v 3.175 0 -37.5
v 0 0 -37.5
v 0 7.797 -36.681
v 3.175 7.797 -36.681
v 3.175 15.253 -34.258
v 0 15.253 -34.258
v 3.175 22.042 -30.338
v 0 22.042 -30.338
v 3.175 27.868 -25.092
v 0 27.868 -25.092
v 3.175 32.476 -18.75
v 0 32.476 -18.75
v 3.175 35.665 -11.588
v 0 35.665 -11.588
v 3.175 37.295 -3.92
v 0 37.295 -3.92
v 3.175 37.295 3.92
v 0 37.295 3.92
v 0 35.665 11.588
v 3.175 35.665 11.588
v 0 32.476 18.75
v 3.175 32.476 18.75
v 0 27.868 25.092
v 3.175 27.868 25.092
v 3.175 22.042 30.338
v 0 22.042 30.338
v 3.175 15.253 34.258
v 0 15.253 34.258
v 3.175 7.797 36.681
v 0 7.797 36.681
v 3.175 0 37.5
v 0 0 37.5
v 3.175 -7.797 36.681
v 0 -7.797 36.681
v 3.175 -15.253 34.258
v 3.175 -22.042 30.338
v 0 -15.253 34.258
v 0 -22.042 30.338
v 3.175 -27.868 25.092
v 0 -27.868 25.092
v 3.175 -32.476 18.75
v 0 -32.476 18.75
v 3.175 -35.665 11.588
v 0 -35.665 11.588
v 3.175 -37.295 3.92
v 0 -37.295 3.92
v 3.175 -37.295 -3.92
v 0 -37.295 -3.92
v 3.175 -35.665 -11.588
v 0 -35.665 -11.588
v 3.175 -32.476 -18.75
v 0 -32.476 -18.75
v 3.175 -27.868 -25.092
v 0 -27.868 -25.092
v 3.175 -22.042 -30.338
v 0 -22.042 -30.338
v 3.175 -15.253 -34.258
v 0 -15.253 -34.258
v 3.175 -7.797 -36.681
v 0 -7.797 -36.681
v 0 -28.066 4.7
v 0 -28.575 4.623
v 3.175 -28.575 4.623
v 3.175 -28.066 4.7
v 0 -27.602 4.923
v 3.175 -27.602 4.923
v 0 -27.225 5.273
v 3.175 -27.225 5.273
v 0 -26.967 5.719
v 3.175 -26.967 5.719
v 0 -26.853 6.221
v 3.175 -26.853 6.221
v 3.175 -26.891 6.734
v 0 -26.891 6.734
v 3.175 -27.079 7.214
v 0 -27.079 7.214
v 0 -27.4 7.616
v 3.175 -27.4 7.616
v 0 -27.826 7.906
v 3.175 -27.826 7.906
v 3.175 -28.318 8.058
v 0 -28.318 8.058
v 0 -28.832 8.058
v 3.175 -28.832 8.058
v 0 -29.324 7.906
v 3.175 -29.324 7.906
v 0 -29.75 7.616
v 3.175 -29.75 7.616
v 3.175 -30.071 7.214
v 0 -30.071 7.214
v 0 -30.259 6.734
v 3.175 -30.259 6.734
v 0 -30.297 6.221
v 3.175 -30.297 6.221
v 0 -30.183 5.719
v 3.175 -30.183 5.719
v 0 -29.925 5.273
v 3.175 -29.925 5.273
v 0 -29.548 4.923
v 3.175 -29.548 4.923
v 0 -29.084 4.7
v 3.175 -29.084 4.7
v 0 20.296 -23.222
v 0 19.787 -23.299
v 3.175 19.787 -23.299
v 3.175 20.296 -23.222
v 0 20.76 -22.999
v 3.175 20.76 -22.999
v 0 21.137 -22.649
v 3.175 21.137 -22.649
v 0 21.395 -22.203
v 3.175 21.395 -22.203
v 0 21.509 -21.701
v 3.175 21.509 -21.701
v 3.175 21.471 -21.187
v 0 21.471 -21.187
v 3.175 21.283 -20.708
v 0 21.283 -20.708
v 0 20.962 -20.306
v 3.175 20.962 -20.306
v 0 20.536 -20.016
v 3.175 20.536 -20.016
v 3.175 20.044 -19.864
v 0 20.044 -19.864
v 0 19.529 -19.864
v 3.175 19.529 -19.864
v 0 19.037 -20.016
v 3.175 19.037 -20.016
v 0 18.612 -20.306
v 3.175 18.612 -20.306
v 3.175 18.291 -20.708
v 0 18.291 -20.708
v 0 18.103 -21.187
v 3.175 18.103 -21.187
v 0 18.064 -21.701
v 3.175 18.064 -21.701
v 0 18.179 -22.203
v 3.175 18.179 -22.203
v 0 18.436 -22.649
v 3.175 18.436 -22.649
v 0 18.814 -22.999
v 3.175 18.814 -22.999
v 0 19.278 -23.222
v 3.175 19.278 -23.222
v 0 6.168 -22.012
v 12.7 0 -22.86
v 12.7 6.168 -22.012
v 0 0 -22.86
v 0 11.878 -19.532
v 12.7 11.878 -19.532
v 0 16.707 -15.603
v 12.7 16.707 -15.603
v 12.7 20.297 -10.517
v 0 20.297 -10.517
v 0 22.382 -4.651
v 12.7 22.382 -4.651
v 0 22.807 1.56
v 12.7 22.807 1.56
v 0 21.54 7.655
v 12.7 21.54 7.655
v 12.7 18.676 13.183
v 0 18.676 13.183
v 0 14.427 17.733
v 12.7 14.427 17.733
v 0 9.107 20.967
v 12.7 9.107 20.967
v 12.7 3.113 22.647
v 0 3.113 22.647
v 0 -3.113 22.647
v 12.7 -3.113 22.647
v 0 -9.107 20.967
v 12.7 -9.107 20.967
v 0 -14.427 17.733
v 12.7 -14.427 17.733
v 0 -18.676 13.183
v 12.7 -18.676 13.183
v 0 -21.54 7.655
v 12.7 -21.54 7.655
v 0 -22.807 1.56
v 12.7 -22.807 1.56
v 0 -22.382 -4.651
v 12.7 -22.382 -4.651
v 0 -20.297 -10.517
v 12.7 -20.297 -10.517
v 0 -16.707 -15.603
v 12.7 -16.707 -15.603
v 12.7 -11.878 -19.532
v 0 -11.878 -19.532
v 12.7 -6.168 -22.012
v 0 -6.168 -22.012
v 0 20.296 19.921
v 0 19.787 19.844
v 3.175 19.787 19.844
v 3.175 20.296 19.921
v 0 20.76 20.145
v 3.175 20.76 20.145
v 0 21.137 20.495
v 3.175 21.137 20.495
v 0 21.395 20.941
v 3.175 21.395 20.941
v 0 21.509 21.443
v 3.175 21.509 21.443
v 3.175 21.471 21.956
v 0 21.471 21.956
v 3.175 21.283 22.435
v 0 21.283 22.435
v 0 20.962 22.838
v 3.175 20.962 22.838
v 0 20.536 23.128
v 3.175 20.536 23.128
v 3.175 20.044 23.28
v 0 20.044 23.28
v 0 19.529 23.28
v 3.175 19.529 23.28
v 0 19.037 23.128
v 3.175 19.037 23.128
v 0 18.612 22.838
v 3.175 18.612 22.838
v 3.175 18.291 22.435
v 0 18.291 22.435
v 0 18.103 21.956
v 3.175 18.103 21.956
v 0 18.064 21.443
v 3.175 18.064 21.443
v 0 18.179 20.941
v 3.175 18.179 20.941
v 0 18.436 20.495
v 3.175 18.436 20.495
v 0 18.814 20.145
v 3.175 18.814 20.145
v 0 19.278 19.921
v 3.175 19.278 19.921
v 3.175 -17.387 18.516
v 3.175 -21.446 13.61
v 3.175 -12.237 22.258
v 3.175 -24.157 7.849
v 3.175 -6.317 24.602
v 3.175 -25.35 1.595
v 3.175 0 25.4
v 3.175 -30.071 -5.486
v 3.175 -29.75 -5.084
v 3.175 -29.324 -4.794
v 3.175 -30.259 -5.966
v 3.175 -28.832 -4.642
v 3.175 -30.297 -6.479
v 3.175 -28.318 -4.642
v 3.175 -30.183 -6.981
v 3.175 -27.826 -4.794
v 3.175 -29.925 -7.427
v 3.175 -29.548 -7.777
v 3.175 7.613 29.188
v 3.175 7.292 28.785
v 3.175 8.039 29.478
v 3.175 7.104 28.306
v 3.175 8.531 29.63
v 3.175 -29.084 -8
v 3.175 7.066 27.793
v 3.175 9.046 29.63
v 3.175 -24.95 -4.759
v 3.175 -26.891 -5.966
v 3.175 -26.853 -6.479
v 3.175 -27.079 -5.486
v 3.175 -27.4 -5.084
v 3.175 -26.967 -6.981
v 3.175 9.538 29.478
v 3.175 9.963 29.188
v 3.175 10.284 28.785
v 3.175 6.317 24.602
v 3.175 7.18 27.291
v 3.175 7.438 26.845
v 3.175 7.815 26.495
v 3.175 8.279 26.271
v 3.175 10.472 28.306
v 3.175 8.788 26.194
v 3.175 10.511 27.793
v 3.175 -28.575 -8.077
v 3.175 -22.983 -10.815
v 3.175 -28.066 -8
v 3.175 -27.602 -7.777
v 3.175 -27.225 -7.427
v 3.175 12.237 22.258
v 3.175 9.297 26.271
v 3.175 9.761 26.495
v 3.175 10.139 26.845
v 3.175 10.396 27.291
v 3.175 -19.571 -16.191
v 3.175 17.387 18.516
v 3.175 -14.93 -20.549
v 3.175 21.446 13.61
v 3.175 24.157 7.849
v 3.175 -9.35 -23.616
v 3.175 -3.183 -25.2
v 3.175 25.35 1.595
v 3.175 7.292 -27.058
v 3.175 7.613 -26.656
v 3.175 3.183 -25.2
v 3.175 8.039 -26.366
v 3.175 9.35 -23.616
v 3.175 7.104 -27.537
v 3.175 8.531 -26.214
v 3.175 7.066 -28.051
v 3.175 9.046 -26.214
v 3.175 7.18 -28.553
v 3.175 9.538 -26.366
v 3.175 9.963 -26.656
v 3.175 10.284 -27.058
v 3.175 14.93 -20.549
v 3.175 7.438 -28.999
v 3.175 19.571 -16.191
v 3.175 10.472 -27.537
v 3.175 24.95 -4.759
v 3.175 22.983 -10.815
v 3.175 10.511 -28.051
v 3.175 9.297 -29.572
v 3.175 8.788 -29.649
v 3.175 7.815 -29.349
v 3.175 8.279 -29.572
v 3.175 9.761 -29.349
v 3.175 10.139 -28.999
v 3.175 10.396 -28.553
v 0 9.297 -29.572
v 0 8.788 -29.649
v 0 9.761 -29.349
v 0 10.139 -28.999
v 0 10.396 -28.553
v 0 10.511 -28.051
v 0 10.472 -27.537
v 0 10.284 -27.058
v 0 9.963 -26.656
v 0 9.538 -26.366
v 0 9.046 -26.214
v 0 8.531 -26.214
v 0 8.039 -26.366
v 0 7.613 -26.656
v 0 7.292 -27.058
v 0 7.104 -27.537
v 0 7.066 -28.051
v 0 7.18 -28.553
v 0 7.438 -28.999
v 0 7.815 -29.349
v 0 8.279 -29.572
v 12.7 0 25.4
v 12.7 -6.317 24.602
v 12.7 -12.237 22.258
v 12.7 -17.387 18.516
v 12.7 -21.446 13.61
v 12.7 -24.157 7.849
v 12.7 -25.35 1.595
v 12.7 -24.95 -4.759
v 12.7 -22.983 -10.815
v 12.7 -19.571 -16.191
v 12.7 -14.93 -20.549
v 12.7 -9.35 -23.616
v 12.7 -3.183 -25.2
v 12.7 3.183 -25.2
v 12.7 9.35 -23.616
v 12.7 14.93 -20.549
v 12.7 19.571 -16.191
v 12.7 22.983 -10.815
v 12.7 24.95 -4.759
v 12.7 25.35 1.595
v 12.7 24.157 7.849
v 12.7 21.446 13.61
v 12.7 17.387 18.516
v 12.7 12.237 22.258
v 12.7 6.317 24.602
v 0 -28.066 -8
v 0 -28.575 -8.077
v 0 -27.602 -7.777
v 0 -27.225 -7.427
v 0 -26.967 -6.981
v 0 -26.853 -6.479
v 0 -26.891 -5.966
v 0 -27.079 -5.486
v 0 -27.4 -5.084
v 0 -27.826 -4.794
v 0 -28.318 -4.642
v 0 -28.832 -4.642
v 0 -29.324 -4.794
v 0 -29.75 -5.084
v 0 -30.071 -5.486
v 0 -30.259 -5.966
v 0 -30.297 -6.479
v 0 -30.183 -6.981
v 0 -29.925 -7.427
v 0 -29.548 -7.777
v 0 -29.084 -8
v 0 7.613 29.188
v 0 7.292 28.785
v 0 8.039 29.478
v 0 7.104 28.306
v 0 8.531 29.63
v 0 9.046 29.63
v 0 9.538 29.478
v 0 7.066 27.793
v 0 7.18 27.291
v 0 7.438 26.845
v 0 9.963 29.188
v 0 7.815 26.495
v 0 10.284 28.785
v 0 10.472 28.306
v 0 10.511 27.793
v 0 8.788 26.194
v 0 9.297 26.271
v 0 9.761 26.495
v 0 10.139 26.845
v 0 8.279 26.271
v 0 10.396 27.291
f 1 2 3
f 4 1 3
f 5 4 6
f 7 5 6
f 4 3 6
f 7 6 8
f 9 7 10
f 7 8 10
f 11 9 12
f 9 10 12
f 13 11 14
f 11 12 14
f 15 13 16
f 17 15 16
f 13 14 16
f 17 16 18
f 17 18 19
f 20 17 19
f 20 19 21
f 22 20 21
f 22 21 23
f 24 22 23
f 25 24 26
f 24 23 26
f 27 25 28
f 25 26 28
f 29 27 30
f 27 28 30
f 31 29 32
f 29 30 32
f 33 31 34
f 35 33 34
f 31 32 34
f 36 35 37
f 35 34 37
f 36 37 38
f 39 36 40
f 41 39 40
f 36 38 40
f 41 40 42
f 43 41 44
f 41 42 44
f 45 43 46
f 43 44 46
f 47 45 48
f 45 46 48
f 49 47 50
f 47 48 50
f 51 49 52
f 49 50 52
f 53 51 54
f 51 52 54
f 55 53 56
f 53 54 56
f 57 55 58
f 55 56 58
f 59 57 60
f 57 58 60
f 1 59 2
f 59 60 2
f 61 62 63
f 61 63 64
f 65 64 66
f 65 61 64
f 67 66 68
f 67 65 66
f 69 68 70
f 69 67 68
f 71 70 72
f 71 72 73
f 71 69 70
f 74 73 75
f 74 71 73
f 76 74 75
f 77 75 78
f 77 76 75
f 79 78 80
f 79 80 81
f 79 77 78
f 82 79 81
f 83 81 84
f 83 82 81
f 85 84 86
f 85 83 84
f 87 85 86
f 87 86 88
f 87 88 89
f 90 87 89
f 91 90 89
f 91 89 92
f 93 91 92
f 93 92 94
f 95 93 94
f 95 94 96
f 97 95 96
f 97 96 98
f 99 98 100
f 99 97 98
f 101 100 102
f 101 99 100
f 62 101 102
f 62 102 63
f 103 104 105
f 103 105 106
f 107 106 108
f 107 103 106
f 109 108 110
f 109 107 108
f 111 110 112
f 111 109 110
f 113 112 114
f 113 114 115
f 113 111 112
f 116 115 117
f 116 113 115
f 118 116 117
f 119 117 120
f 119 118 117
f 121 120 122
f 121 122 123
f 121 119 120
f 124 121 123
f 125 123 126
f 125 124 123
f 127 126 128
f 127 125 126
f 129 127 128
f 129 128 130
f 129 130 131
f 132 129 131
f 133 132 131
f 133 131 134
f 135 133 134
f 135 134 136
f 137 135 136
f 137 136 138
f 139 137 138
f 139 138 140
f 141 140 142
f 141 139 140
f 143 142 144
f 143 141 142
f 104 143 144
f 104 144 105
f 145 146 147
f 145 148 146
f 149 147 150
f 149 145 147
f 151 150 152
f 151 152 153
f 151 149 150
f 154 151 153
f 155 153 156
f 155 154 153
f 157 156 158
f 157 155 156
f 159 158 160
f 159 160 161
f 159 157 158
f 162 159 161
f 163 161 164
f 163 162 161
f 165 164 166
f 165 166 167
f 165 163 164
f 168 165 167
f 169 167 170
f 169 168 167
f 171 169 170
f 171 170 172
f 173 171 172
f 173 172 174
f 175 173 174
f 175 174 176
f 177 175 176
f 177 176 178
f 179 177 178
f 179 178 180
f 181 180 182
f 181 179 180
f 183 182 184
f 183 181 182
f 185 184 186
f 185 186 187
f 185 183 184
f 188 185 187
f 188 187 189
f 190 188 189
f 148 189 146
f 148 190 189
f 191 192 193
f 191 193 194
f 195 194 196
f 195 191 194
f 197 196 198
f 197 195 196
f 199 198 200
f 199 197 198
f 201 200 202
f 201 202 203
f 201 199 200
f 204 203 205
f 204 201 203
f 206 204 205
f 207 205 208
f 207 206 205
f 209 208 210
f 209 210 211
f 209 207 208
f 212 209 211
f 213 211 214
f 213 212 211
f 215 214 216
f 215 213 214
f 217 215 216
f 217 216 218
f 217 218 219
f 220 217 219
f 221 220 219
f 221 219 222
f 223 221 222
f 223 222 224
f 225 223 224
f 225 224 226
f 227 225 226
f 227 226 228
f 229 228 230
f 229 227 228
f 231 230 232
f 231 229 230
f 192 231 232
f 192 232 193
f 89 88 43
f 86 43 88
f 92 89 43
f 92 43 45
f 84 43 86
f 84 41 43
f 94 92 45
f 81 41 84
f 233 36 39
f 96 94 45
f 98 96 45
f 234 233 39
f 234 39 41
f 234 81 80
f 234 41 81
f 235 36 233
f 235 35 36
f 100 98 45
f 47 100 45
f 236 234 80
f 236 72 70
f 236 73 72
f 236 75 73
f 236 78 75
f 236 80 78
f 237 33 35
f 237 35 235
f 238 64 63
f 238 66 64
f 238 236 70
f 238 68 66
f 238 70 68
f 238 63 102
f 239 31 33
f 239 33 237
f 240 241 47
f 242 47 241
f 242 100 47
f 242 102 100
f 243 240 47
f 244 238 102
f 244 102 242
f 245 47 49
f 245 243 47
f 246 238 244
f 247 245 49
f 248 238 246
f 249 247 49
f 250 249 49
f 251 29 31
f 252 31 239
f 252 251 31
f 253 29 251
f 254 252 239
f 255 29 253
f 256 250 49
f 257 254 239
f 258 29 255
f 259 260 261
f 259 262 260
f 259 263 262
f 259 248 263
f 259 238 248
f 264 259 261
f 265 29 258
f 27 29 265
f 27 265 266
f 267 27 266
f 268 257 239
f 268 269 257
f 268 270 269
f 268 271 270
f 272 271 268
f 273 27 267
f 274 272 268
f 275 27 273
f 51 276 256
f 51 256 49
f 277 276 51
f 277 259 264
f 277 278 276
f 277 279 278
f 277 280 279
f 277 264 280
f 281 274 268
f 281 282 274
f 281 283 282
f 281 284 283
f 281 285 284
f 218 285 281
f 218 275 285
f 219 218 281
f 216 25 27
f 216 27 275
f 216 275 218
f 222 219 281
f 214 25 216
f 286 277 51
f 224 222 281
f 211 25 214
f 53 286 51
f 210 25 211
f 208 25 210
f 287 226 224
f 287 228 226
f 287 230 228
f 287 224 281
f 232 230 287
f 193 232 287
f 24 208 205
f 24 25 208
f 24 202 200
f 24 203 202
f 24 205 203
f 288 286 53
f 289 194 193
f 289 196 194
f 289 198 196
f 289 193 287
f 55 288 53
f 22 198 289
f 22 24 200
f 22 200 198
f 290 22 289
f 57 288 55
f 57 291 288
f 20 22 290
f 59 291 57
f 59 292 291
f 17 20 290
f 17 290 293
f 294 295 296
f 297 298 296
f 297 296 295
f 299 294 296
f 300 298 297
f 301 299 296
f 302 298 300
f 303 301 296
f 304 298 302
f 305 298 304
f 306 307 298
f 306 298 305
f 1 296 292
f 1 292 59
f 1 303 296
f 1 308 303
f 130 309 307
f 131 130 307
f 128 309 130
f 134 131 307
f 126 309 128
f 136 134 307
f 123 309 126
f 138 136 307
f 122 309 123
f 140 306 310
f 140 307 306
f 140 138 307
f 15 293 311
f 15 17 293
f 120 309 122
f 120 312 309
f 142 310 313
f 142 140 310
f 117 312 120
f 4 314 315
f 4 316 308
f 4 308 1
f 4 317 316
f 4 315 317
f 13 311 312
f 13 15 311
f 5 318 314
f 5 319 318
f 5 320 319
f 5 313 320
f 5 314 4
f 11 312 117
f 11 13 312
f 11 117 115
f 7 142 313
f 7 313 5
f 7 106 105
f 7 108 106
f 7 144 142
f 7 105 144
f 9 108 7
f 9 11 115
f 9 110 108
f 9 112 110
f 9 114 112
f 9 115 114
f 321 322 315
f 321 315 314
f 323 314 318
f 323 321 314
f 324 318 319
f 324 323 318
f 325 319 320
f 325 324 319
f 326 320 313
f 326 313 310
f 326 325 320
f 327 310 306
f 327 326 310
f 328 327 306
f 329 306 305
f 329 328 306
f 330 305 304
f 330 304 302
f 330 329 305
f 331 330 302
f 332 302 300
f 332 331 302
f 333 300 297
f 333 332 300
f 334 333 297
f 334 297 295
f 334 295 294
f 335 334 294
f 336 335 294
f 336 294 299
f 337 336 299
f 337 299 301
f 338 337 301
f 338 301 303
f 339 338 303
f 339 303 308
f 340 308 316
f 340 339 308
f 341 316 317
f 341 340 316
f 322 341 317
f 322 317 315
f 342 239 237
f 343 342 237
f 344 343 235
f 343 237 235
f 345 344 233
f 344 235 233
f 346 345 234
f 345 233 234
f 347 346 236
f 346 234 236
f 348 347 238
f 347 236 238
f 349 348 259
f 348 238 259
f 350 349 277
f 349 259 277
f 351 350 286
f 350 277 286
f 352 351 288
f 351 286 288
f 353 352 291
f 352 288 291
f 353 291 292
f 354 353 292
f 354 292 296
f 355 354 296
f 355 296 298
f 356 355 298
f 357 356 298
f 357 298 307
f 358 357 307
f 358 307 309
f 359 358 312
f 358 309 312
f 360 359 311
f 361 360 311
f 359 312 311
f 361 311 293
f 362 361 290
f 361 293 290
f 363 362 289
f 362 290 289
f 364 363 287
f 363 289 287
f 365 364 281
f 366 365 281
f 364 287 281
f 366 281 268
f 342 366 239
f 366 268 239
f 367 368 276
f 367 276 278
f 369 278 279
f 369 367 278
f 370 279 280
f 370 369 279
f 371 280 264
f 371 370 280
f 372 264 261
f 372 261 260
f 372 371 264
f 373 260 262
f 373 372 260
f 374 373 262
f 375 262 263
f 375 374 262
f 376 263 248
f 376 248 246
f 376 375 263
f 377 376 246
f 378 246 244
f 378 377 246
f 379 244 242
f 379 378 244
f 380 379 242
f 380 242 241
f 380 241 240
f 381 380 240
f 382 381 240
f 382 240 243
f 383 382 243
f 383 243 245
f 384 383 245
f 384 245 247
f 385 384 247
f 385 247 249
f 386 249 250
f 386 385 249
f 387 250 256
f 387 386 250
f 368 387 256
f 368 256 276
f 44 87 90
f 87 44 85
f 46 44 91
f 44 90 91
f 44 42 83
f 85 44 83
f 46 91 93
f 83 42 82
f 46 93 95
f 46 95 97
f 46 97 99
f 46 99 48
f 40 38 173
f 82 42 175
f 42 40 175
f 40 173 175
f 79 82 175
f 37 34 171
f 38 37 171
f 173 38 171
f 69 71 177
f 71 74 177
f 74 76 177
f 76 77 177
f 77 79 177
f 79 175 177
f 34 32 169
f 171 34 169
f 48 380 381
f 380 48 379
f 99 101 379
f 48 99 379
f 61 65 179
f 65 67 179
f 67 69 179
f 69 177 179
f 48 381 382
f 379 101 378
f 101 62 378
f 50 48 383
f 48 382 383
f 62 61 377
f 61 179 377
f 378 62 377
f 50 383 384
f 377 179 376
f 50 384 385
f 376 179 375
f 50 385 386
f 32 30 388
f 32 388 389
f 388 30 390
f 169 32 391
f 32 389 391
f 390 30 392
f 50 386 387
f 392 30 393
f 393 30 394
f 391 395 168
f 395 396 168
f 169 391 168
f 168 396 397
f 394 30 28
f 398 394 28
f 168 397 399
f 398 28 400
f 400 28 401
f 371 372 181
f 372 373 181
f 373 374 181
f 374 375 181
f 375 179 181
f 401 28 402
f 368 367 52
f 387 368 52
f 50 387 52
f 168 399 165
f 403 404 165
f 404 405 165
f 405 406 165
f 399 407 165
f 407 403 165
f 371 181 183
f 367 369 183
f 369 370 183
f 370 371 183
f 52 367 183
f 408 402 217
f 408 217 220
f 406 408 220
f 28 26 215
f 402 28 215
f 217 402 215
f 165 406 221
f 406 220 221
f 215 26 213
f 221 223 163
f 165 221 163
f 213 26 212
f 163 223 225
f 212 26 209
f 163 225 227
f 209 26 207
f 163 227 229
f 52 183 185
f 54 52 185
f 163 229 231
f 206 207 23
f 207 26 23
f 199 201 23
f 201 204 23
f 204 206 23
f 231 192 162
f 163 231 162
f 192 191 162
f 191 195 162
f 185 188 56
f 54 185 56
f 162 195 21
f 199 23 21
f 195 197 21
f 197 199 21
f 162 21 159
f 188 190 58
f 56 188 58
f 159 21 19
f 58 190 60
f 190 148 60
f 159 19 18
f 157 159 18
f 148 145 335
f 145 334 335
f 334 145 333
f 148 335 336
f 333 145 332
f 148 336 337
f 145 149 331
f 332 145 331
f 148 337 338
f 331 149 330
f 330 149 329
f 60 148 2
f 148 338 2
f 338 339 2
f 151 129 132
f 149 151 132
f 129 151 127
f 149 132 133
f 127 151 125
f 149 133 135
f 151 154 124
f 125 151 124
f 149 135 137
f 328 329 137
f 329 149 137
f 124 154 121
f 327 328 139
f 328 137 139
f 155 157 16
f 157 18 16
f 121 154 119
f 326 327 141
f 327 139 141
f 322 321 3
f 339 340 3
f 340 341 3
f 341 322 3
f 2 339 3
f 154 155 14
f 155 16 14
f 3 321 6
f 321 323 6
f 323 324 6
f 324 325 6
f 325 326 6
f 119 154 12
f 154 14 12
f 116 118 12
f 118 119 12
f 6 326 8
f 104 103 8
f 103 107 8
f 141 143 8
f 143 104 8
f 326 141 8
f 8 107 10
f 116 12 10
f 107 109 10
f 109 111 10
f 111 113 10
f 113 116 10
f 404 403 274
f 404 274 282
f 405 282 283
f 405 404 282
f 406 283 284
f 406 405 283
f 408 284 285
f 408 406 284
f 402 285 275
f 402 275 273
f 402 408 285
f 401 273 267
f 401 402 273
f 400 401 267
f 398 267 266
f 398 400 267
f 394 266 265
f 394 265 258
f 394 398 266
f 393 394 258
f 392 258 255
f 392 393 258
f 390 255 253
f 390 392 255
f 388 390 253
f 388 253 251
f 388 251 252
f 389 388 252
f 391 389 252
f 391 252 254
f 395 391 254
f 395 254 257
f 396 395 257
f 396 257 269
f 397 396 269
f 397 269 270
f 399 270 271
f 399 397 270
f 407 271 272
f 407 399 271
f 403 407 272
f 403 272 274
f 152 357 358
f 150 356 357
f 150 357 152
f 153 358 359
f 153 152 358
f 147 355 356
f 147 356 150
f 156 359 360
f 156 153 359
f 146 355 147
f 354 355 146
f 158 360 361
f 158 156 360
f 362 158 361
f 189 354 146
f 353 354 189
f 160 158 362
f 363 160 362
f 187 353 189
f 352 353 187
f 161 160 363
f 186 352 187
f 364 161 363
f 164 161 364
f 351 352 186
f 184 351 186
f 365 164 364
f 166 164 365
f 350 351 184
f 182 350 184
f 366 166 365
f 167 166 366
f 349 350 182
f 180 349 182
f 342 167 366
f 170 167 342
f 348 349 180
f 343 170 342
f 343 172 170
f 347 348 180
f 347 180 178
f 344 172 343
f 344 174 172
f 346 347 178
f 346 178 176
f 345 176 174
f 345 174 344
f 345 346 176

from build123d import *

# Parameters (mm, degrees)
SKETCH2_R           = 37.5
SKETCH2_R_2         = 1.7272
SKETCH2_R_3         = 22.86
BOSS_EXTRUDE1_DEPTH = 3.175
SKETCH3_R           = 25.4
SKETCH3_R_2         = 22.86
BOSS_EXTRUDE2_DEPTH = 9.525


with BuildPart() as part:
    # Sketch2 → Boss-Extrude1 (new body)
    with BuildSketch(Plane(origin=(0, 0, 0), x_dir=(0, 0, -1), z_dir=(1, 0, 0))):
        Circle(SKETCH2_R)
        with Locations((27.921675913, 8.788238686)):
            Circle(SKETCH2_R_2, mode=Mode.SUBTRACT)
        with Locations((21.571675913, 19.786761314)):
            Circle(SKETCH2_R_2, mode=Mode.SUBTRACT)
        with Locations((-21.571675913, 19.786761314)):
            Circle(SKETCH2_R_2, mode=Mode.SUBTRACT)
        with Locations((-27.921675913, 8.788238686)):
            Circle(SKETCH2_R_2, mode=Mode.SUBTRACT)
        with Locations((-6.35, -28.575)):
            Circle(SKETCH2_R_2, mode=Mode.SUBTRACT)
        with Locations((6.35, -28.575)):
            Circle(SKETCH2_R_2, mode=Mode.SUBTRACT)
        Circle(SKETCH2_R_3, mode=Mode.SUBTRACT)
    extrude(amount=BOSS_EXTRUDE1_DEPTH)

    # Sketch3 → Boss-Extrude2 (add)
    with BuildSketch(Plane(origin=(3.175, 0, 0), x_dir=(0, 0, -1), z_dir=(1, 0, 0))):
        with Locations(Location((0, 0, 0), (0, 0, 180))):
            Circle(SKETCH3_R)
        Circle(SKETCH3_R_2, mode=Mode.SUBTRACT)
    extrude(amount=BOSS_EXTRUDE2_DEPTH)


solid = part.part
